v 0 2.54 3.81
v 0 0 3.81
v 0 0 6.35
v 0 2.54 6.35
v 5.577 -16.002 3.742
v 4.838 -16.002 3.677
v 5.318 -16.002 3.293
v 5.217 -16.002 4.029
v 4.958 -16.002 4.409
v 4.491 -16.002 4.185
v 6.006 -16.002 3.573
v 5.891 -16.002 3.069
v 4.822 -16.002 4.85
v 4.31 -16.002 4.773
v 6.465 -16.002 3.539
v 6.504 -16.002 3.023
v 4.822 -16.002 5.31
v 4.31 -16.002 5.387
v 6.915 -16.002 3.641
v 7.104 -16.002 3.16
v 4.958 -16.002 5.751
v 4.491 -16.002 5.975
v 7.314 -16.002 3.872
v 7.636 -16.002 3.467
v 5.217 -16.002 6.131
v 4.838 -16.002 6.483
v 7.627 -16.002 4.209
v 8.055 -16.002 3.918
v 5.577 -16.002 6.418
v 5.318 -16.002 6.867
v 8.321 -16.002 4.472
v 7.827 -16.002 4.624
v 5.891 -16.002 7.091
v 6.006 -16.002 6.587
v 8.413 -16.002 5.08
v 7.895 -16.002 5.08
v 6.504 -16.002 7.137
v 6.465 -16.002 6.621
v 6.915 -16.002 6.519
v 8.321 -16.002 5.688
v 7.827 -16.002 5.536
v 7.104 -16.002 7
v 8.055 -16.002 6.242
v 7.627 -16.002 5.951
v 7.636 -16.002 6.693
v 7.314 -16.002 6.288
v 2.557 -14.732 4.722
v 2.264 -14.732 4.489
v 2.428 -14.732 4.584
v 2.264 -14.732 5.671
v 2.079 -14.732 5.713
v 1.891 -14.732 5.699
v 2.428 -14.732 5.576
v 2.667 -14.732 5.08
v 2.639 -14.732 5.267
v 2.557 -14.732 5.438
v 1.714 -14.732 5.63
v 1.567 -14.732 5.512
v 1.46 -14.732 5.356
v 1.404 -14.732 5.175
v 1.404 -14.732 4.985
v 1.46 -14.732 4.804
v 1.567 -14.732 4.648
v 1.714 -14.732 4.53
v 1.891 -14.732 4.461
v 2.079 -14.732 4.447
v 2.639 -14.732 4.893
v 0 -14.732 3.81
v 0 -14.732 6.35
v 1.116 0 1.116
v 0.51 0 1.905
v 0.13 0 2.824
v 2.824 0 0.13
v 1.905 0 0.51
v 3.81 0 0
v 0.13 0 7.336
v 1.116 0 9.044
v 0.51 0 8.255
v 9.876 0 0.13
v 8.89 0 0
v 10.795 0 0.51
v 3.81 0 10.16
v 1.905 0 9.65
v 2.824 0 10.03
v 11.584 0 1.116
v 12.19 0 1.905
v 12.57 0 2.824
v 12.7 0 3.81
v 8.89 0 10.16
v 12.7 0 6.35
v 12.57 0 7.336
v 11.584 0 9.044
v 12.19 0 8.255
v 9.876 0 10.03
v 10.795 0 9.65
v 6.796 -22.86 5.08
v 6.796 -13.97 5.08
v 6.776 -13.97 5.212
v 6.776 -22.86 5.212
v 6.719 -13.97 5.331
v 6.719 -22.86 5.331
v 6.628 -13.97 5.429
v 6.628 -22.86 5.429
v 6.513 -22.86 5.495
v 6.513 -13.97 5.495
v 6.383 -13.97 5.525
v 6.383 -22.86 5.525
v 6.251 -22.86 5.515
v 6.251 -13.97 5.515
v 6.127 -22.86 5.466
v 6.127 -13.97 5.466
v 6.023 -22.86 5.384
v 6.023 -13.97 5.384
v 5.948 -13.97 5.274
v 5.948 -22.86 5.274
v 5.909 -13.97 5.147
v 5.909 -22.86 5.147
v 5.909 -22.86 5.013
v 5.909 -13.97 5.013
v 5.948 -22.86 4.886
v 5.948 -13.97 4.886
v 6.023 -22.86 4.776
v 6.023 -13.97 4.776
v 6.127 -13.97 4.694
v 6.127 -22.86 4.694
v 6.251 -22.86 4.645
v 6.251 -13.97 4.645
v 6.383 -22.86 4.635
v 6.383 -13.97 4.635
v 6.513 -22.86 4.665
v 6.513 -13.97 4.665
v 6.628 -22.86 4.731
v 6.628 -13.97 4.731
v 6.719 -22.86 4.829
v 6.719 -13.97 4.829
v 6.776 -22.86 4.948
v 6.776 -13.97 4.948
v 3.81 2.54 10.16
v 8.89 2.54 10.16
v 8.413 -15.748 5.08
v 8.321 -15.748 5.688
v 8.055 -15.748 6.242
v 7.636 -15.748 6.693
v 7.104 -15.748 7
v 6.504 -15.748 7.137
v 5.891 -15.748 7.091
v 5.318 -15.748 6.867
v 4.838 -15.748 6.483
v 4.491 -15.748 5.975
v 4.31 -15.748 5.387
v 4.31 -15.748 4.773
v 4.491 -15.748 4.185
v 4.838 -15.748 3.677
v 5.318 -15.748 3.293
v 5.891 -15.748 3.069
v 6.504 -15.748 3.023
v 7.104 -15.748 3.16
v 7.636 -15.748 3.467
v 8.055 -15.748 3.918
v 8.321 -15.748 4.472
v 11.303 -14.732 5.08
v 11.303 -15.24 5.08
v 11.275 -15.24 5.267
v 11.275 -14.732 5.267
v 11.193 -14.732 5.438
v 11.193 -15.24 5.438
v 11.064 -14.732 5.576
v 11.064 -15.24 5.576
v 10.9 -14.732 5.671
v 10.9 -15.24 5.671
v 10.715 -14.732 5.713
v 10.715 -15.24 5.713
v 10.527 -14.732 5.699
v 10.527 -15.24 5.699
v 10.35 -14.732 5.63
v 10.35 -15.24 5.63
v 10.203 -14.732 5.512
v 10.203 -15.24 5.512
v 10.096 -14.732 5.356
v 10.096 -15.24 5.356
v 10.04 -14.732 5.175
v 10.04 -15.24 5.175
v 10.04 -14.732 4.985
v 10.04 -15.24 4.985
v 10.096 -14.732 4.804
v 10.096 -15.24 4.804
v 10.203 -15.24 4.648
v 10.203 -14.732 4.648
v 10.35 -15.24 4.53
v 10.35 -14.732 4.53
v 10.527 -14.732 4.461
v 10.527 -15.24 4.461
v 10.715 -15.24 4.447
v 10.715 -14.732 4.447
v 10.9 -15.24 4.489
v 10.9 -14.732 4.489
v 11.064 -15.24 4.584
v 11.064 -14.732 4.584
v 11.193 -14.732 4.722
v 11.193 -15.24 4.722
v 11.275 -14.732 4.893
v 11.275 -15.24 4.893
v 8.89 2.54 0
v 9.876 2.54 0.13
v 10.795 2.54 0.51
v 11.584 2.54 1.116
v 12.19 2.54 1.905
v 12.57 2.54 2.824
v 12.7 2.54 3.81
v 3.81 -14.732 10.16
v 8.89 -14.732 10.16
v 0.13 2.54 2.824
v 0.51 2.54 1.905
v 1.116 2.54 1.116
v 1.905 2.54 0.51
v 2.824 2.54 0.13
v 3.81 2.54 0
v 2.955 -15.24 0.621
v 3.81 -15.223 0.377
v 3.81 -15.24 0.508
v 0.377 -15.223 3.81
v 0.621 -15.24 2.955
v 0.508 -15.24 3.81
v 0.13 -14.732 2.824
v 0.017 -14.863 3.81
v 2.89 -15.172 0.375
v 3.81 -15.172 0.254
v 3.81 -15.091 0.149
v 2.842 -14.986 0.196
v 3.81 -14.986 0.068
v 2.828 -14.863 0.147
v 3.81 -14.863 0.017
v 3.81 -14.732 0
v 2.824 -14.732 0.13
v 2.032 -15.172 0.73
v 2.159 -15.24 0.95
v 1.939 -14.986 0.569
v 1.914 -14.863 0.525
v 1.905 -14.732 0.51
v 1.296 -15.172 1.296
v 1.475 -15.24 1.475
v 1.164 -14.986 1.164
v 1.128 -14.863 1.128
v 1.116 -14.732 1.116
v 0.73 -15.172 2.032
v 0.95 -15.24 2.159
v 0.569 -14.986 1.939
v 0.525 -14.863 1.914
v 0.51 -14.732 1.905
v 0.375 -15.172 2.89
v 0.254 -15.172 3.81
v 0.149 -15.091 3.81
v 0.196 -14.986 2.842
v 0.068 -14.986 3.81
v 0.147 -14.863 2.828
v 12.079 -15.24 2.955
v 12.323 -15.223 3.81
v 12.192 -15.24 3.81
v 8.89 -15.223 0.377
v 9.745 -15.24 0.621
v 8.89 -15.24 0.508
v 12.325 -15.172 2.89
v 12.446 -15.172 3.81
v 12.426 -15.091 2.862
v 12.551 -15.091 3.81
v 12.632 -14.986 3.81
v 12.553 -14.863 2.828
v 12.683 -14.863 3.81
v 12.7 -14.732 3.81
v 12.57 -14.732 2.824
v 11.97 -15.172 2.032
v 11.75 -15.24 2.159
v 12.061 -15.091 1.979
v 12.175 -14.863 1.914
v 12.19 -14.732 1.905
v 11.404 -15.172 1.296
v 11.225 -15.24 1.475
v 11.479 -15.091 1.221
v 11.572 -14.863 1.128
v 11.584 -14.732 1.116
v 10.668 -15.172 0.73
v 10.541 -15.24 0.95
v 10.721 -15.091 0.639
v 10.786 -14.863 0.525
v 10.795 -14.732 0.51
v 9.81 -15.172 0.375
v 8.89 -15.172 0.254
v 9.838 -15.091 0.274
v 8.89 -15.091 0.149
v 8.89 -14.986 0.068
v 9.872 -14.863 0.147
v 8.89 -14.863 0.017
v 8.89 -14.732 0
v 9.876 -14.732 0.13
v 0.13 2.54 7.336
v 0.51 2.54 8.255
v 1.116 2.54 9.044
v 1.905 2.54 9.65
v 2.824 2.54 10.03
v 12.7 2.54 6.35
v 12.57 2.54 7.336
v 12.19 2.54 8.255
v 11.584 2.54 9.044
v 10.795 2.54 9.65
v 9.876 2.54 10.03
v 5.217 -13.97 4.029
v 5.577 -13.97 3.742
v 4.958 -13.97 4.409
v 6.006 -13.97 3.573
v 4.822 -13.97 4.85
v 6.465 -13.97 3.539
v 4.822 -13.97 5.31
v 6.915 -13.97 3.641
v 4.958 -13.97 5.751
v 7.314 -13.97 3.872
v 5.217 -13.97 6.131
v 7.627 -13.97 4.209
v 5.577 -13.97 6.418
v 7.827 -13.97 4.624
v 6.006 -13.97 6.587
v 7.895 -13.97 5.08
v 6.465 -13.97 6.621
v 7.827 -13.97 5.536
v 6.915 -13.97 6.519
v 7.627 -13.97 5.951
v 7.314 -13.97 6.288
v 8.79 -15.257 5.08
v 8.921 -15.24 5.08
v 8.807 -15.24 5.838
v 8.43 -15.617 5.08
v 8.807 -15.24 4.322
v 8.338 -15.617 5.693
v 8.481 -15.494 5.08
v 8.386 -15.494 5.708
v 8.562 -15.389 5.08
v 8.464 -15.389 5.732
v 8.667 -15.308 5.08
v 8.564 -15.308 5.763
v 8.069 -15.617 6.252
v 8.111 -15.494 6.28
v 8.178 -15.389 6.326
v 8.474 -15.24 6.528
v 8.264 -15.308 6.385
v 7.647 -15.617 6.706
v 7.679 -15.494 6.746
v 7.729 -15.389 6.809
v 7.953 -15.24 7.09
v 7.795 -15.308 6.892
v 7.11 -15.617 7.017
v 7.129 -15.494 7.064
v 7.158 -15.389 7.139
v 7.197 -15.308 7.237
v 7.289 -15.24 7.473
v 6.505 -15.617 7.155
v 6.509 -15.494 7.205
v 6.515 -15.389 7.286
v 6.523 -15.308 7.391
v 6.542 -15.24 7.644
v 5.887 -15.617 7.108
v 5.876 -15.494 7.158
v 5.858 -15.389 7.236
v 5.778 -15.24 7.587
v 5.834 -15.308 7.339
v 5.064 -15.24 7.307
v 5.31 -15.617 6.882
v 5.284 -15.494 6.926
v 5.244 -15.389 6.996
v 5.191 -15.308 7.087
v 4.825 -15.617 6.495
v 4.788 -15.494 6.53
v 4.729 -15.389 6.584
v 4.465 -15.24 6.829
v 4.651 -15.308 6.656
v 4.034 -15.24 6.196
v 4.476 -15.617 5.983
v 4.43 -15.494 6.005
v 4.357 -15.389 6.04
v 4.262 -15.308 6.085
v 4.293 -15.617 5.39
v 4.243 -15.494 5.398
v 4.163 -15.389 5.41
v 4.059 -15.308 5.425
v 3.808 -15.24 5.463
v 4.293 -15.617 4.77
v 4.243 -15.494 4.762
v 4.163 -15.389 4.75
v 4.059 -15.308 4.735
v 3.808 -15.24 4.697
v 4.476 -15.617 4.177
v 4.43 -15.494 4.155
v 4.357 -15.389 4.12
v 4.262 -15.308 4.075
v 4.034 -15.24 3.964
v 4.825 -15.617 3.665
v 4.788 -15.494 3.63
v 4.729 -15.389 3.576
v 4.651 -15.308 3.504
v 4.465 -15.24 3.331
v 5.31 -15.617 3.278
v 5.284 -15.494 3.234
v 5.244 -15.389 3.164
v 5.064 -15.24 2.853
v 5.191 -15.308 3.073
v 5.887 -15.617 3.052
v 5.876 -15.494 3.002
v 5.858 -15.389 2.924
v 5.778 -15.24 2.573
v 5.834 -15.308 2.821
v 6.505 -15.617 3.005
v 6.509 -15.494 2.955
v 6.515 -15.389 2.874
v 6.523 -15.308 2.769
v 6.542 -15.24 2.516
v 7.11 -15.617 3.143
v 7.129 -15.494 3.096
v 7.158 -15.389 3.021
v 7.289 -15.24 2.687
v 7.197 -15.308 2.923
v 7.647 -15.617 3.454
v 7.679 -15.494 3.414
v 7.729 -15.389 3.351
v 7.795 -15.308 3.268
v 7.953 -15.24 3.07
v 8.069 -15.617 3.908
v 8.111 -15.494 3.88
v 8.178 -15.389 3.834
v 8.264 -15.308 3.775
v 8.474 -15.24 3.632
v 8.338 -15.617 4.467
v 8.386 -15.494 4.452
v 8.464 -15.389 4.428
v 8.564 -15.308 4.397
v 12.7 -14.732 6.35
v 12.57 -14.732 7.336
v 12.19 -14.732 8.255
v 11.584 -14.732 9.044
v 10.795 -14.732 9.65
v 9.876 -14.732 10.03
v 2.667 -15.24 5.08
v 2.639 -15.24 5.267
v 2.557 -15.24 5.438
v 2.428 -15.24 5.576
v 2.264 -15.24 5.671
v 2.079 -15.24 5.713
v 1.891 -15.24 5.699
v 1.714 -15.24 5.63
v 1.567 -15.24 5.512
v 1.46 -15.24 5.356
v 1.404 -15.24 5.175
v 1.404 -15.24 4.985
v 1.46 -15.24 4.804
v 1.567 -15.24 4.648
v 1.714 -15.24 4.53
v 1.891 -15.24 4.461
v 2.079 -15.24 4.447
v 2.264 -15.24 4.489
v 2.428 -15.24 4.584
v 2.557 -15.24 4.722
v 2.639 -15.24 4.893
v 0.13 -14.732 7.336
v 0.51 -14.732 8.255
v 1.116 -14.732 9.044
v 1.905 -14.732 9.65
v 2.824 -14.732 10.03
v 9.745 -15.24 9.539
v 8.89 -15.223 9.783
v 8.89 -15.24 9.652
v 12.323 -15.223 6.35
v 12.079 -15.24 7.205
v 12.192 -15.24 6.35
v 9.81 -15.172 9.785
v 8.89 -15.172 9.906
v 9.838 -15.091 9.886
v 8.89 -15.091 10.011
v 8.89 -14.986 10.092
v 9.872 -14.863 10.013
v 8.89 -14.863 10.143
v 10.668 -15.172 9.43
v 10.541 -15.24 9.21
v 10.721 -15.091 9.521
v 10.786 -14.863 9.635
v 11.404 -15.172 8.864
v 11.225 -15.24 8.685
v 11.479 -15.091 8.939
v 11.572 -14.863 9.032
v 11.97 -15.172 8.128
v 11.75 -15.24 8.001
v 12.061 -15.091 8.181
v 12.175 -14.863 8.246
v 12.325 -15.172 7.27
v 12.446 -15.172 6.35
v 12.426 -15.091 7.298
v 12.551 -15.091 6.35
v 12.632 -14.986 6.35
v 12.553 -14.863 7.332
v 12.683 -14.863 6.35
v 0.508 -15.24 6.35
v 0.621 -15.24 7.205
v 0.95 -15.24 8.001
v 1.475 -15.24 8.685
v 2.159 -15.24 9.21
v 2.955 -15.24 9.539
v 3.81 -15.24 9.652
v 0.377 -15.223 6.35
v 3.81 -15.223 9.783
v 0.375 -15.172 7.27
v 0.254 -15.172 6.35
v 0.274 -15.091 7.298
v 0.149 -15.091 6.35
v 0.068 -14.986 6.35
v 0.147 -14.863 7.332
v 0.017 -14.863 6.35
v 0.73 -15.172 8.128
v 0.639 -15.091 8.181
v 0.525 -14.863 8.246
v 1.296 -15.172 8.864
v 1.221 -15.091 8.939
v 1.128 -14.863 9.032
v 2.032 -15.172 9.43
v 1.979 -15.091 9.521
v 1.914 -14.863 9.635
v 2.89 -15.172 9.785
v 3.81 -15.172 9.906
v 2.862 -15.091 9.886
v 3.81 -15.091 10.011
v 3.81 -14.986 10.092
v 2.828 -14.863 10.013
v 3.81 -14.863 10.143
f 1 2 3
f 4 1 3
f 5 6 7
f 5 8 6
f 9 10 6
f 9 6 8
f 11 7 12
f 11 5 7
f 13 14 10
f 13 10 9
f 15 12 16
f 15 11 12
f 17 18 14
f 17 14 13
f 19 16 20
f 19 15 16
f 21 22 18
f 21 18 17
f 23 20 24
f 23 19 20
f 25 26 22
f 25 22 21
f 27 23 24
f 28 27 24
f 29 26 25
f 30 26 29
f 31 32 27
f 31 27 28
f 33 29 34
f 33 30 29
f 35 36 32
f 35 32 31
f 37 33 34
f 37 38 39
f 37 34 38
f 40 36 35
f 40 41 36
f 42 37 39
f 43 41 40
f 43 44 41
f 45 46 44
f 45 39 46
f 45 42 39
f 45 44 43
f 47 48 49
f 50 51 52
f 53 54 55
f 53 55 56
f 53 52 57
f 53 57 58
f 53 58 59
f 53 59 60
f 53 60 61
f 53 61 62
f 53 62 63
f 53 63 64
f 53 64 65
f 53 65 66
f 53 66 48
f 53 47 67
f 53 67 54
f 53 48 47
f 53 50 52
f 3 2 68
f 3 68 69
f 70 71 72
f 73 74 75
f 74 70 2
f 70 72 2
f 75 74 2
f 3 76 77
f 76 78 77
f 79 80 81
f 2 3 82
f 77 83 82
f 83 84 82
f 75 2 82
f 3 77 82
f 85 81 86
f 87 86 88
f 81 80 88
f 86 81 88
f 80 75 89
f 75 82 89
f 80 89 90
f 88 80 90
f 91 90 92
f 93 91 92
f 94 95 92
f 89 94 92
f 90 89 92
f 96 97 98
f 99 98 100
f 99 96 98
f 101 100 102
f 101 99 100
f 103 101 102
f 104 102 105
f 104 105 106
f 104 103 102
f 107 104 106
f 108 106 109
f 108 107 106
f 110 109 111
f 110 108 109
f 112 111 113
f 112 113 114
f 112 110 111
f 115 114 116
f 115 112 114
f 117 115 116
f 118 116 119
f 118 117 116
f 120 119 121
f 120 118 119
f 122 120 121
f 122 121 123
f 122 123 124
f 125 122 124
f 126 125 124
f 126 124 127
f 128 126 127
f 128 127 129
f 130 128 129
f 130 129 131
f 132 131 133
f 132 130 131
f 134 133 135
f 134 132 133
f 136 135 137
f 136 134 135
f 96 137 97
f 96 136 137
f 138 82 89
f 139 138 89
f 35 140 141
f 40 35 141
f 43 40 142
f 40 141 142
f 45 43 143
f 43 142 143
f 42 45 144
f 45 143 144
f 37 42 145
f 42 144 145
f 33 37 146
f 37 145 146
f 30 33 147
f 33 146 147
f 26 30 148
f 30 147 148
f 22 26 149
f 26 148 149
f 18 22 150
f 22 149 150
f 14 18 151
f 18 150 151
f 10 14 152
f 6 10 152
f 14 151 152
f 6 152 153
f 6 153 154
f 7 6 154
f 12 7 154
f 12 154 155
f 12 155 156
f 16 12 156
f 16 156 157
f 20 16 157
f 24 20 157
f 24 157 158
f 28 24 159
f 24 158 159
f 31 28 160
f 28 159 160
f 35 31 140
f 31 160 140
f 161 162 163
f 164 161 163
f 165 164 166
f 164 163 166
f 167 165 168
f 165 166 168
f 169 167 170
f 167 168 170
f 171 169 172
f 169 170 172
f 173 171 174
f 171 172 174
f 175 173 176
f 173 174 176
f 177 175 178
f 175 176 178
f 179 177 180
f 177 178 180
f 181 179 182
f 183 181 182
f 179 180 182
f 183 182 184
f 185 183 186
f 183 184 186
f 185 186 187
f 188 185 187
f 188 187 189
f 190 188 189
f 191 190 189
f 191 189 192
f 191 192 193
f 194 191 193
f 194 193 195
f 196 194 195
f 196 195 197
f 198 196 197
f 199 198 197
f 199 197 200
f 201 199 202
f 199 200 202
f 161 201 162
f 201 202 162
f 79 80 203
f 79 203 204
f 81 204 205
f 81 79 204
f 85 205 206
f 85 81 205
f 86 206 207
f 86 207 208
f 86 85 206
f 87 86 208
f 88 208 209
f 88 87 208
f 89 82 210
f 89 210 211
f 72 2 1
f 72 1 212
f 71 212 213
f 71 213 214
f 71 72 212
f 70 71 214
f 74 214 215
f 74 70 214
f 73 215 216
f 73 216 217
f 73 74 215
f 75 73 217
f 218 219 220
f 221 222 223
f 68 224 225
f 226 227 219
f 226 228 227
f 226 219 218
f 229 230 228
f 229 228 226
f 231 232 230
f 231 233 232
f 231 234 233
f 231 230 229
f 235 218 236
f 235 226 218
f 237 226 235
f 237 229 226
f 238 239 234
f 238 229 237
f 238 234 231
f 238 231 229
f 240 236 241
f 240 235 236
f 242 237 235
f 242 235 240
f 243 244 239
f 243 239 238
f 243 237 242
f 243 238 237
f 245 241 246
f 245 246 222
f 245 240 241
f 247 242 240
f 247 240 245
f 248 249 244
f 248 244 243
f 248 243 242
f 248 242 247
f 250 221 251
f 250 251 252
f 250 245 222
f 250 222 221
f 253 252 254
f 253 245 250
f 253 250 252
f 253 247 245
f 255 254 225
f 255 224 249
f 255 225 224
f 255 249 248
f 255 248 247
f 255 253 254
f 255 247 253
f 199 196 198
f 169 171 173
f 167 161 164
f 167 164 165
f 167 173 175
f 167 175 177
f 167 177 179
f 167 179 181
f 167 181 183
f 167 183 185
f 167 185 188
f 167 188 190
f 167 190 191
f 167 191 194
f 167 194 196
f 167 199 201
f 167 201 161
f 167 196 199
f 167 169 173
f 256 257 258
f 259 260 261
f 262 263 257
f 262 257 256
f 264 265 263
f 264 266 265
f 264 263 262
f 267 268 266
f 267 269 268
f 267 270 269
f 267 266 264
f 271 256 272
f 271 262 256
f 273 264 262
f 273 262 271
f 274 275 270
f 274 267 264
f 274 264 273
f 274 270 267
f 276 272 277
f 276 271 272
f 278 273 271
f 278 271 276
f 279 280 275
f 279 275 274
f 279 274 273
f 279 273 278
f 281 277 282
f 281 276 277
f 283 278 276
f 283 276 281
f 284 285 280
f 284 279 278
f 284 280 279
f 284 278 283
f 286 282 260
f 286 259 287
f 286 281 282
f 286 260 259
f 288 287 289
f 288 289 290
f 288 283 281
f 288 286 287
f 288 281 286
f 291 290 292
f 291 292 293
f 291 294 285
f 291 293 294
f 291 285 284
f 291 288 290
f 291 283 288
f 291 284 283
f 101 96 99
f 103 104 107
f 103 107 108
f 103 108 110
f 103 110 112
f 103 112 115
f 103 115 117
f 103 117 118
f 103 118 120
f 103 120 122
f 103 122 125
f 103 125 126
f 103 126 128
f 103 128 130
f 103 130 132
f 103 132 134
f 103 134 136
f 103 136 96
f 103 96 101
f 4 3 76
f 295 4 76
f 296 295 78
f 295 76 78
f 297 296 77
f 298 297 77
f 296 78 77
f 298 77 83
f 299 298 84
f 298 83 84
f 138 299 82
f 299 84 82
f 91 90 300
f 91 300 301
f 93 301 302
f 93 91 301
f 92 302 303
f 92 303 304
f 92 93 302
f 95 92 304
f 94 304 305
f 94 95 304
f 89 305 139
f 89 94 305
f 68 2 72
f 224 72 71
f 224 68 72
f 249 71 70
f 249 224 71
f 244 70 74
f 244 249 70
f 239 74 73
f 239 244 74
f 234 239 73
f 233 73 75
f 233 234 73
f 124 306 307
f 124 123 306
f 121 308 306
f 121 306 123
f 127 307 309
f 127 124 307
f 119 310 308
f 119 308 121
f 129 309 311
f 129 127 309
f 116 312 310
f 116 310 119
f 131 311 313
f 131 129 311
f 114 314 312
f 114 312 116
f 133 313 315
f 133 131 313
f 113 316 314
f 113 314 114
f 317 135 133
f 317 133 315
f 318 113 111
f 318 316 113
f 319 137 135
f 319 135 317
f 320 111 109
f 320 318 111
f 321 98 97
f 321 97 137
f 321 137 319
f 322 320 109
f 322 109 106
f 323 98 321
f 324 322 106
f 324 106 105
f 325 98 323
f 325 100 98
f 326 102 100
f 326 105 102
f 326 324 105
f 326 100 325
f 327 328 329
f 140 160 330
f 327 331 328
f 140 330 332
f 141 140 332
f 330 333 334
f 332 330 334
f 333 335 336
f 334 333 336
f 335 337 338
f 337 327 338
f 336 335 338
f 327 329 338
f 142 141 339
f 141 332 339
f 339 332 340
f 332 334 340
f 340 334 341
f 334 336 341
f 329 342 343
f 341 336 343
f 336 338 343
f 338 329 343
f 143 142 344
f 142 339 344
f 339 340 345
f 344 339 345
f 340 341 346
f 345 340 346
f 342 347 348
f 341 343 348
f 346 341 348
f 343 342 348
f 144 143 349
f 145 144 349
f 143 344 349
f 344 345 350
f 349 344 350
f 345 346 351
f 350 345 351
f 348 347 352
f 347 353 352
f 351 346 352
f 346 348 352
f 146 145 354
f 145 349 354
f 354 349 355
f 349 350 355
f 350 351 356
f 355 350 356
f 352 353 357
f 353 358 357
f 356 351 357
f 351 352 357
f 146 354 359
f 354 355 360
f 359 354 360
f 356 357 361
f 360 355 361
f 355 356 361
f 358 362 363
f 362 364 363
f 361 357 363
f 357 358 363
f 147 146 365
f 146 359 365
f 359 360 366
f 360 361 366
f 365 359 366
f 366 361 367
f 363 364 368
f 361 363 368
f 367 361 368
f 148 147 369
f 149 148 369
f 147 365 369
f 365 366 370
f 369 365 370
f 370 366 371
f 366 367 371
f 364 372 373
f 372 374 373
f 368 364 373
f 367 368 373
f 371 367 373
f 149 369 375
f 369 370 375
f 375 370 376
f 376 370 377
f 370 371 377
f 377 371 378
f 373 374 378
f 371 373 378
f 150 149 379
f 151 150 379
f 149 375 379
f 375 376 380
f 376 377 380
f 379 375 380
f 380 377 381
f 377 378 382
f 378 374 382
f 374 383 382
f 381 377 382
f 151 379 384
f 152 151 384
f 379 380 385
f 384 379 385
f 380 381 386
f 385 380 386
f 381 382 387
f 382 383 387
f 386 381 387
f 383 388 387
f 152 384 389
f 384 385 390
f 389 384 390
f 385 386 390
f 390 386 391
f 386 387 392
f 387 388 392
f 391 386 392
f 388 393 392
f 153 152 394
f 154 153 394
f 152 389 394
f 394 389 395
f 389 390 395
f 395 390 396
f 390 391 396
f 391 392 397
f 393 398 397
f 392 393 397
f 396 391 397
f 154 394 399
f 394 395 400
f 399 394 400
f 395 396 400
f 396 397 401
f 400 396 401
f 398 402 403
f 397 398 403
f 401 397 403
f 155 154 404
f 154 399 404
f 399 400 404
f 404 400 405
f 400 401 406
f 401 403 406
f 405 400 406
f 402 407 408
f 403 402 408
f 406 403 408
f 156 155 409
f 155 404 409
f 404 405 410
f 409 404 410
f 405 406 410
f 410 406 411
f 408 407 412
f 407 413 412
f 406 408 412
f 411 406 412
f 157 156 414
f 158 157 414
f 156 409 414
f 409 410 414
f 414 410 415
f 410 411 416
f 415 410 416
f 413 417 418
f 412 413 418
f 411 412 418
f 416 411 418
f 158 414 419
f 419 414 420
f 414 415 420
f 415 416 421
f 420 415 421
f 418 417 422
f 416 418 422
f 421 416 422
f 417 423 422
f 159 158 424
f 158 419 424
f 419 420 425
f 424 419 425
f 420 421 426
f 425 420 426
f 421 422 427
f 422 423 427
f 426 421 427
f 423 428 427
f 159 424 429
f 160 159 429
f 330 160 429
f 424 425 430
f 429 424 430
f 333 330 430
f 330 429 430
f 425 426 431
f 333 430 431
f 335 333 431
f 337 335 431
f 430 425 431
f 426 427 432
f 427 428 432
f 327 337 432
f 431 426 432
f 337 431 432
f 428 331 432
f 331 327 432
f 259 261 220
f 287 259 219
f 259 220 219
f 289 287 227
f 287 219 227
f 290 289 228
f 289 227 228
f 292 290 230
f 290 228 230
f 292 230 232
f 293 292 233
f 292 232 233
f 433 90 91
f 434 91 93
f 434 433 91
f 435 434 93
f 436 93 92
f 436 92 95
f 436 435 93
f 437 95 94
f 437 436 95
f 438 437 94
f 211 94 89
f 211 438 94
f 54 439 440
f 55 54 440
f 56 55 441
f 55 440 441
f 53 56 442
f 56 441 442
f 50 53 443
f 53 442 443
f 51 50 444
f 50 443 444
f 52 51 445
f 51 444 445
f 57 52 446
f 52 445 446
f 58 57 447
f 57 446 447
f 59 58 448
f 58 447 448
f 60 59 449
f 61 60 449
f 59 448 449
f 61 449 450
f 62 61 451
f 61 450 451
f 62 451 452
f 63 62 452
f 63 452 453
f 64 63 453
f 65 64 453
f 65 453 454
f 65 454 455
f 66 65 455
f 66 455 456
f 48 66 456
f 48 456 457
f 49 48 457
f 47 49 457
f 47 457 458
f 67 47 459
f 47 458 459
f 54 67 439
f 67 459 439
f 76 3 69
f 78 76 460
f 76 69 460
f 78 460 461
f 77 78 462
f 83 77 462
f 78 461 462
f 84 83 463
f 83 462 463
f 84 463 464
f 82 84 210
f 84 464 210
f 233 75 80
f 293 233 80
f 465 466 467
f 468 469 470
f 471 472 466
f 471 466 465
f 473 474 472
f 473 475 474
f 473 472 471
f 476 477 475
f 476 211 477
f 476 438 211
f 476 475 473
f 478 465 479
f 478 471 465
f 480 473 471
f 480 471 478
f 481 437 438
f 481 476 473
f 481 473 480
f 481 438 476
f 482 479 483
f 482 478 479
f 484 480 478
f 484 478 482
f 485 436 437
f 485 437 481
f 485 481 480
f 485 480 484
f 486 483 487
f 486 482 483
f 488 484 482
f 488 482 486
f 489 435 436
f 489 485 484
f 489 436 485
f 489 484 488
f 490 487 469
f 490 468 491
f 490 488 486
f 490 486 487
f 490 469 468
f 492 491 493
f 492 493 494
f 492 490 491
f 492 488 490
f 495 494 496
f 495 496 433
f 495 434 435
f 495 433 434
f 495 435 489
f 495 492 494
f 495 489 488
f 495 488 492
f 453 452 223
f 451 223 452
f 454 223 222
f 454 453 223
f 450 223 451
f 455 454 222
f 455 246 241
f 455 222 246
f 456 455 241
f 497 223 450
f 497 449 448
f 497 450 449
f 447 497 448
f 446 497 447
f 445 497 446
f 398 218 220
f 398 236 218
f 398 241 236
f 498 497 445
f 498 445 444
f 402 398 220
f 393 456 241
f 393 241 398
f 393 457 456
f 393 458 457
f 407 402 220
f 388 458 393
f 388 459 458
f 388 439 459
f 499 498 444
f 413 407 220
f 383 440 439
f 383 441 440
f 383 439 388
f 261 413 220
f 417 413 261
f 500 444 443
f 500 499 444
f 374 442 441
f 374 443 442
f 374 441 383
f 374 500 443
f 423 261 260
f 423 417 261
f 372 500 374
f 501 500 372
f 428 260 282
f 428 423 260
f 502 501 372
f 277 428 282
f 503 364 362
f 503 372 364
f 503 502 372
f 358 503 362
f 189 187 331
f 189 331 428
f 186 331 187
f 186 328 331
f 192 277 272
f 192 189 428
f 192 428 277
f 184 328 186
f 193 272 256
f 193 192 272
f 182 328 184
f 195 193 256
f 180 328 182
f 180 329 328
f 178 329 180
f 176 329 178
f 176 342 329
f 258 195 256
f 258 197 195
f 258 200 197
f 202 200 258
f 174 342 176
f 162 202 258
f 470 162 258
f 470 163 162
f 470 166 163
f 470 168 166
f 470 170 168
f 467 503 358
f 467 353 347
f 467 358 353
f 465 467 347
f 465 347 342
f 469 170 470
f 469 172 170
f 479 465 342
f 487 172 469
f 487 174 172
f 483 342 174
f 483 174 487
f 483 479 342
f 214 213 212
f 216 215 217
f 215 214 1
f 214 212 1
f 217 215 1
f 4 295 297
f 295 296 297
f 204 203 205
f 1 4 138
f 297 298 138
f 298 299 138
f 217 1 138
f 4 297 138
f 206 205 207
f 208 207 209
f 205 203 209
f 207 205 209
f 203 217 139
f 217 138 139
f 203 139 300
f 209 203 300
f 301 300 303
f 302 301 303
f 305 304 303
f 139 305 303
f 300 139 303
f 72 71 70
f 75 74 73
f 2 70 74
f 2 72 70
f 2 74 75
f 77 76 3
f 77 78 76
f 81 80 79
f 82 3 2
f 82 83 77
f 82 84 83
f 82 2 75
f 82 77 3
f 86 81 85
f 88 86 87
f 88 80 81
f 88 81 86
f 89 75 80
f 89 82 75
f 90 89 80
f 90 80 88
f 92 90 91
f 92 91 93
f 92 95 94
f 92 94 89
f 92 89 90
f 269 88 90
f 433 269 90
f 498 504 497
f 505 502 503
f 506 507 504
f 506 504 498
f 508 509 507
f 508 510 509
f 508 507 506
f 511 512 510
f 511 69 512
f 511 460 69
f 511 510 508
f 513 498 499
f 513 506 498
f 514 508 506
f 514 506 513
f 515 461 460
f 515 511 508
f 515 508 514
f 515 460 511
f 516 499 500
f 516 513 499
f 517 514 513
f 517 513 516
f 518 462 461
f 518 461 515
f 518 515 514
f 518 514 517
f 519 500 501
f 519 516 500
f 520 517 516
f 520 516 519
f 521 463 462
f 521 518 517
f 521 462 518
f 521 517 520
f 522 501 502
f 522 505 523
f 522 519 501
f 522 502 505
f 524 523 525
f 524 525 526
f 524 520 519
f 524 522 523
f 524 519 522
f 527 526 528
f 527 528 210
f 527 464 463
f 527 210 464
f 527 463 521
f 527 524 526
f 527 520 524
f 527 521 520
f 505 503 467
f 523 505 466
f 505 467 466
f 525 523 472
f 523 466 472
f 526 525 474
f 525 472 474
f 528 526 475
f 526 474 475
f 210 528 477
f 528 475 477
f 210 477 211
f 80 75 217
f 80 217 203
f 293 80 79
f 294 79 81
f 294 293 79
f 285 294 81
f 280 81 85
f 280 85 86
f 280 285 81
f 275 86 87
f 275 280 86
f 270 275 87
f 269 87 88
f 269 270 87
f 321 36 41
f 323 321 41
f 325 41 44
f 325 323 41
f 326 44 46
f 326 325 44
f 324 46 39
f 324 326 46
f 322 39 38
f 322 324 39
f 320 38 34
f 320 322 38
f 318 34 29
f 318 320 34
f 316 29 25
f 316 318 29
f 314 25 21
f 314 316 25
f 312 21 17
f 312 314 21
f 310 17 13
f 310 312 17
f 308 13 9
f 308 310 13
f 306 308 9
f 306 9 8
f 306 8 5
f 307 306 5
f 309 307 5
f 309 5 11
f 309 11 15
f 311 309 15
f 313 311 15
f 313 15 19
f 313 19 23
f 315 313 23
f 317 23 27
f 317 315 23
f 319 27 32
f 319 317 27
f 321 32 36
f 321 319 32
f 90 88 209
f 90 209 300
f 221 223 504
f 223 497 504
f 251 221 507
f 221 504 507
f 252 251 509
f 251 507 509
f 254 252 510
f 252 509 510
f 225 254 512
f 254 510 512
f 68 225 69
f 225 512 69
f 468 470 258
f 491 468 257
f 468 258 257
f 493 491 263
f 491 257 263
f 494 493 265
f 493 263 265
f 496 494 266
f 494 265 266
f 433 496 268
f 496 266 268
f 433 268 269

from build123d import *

# Parameters (mm, degrees)
F0_W     = 12.7
F0_H     = 10.16
F1_DEPTH = 15.24
F2_R     = 3.81
F3_R     = 1.5454546585
F3_R_2   = 0.4462657604
F4_DEPTH = 1.27
F3_R_3   = 2.0630546014
F5_DEPTH = 0.762
F6_DEPTH = 7.62
F7_R     = 0.508
F3_R_4   = 0.635
F8_DEPTH = 0.508
F9_DEPTH = 2.54


with BuildPart() as f1:
    # F0 (on Front) → F1 (new body)
    with BuildSketch(Plane.XZ):
        with Locations((6.35, 5.08)):
            Rectangle(F0_W, F0_H)
    extrude(amount=F1_DEPTH)

    # F2
    f2_edges = [f1.edges().sort_by_distance(p)[0] for p in [
        (0, -7.62, 10.16),
        (12.7, -7.62, 10.16),
        (0, -7.62, 0),
        (12.7, -7.62, 0),
    ]]
    fillet(f2_edges, radius=F2_R)

    # F3 (on face) → F4 (cut)
    with BuildSketch(Plane.XZ.offset(15.24)):
        with Locations((6.35, 5.08)):
            Circle(F3_R)
        with Locations((6.35, 5.08)):
            Circle(F3_R_2, mode=Mode.SUBTRACT)
    extrude(amount=-F4_DEPTH, mode=Mode.SUBTRACT)

    # F3 (on face) → F5 (join)
    with BuildSketch(Plane.XZ.offset(15.24)):
        with Locations((6.35, 5.08)):
            Circle(F3_R_3)
        with Locations((6.35, 5.08)):
            Circle(F3_R, mode=Mode.SUBTRACT)
    extrude(amount=F5_DEPTH)

    # F6 (add): a face of the model
    f6_faces = [f1.faces().sort_by_distance(p)[0] for p in [
        (6.35, -15.24, 5.08),
    ]]
    extrude(f6_faces, amount=F6_DEPTH)

    # F7
    f7_edges = [f1.edges().sort_by_distance(p)[0] for p in [
        (0, -15.24, 5.08),
        (1.115923, -15.24, 9.044077),
        (1.115923, -15.24, 1.115923),
        (6.35, -15.24, 10.16),
        (6.35, -15.24, 0),
        (11.584077, -15.24, 9.044077),
        (11.584077, -15.24, 1.115923),
        (12.7, -15.24, 5.08),
        (4.286945, -15.24, 5.08),
    ]]
    fillet(f7_edges, radius=F7_R)

    # F3 (on face) → F8 (cut)
    with BuildSketch(Plane.XZ.offset(15.24)):
        with Locations((2.032, 5.08)):
            Circle(F3_R_4)
        with Locations((10.668, 5.08)):
            Circle(F3_R_4)
    extrude(amount=-F8_DEPTH, mode=Mode.SUBTRACT)


with BuildPart() as f9:
    # F9 (new): a face of the model
    f9_faces = [f1.part.faces().sort_by_distance(p)[0] for p in [
        (6.35, 0, 5.08),
    ]]
    extrude(f9_faces, amount=F9_DEPTH)


solid = Compound([f1.part, f9.part])
